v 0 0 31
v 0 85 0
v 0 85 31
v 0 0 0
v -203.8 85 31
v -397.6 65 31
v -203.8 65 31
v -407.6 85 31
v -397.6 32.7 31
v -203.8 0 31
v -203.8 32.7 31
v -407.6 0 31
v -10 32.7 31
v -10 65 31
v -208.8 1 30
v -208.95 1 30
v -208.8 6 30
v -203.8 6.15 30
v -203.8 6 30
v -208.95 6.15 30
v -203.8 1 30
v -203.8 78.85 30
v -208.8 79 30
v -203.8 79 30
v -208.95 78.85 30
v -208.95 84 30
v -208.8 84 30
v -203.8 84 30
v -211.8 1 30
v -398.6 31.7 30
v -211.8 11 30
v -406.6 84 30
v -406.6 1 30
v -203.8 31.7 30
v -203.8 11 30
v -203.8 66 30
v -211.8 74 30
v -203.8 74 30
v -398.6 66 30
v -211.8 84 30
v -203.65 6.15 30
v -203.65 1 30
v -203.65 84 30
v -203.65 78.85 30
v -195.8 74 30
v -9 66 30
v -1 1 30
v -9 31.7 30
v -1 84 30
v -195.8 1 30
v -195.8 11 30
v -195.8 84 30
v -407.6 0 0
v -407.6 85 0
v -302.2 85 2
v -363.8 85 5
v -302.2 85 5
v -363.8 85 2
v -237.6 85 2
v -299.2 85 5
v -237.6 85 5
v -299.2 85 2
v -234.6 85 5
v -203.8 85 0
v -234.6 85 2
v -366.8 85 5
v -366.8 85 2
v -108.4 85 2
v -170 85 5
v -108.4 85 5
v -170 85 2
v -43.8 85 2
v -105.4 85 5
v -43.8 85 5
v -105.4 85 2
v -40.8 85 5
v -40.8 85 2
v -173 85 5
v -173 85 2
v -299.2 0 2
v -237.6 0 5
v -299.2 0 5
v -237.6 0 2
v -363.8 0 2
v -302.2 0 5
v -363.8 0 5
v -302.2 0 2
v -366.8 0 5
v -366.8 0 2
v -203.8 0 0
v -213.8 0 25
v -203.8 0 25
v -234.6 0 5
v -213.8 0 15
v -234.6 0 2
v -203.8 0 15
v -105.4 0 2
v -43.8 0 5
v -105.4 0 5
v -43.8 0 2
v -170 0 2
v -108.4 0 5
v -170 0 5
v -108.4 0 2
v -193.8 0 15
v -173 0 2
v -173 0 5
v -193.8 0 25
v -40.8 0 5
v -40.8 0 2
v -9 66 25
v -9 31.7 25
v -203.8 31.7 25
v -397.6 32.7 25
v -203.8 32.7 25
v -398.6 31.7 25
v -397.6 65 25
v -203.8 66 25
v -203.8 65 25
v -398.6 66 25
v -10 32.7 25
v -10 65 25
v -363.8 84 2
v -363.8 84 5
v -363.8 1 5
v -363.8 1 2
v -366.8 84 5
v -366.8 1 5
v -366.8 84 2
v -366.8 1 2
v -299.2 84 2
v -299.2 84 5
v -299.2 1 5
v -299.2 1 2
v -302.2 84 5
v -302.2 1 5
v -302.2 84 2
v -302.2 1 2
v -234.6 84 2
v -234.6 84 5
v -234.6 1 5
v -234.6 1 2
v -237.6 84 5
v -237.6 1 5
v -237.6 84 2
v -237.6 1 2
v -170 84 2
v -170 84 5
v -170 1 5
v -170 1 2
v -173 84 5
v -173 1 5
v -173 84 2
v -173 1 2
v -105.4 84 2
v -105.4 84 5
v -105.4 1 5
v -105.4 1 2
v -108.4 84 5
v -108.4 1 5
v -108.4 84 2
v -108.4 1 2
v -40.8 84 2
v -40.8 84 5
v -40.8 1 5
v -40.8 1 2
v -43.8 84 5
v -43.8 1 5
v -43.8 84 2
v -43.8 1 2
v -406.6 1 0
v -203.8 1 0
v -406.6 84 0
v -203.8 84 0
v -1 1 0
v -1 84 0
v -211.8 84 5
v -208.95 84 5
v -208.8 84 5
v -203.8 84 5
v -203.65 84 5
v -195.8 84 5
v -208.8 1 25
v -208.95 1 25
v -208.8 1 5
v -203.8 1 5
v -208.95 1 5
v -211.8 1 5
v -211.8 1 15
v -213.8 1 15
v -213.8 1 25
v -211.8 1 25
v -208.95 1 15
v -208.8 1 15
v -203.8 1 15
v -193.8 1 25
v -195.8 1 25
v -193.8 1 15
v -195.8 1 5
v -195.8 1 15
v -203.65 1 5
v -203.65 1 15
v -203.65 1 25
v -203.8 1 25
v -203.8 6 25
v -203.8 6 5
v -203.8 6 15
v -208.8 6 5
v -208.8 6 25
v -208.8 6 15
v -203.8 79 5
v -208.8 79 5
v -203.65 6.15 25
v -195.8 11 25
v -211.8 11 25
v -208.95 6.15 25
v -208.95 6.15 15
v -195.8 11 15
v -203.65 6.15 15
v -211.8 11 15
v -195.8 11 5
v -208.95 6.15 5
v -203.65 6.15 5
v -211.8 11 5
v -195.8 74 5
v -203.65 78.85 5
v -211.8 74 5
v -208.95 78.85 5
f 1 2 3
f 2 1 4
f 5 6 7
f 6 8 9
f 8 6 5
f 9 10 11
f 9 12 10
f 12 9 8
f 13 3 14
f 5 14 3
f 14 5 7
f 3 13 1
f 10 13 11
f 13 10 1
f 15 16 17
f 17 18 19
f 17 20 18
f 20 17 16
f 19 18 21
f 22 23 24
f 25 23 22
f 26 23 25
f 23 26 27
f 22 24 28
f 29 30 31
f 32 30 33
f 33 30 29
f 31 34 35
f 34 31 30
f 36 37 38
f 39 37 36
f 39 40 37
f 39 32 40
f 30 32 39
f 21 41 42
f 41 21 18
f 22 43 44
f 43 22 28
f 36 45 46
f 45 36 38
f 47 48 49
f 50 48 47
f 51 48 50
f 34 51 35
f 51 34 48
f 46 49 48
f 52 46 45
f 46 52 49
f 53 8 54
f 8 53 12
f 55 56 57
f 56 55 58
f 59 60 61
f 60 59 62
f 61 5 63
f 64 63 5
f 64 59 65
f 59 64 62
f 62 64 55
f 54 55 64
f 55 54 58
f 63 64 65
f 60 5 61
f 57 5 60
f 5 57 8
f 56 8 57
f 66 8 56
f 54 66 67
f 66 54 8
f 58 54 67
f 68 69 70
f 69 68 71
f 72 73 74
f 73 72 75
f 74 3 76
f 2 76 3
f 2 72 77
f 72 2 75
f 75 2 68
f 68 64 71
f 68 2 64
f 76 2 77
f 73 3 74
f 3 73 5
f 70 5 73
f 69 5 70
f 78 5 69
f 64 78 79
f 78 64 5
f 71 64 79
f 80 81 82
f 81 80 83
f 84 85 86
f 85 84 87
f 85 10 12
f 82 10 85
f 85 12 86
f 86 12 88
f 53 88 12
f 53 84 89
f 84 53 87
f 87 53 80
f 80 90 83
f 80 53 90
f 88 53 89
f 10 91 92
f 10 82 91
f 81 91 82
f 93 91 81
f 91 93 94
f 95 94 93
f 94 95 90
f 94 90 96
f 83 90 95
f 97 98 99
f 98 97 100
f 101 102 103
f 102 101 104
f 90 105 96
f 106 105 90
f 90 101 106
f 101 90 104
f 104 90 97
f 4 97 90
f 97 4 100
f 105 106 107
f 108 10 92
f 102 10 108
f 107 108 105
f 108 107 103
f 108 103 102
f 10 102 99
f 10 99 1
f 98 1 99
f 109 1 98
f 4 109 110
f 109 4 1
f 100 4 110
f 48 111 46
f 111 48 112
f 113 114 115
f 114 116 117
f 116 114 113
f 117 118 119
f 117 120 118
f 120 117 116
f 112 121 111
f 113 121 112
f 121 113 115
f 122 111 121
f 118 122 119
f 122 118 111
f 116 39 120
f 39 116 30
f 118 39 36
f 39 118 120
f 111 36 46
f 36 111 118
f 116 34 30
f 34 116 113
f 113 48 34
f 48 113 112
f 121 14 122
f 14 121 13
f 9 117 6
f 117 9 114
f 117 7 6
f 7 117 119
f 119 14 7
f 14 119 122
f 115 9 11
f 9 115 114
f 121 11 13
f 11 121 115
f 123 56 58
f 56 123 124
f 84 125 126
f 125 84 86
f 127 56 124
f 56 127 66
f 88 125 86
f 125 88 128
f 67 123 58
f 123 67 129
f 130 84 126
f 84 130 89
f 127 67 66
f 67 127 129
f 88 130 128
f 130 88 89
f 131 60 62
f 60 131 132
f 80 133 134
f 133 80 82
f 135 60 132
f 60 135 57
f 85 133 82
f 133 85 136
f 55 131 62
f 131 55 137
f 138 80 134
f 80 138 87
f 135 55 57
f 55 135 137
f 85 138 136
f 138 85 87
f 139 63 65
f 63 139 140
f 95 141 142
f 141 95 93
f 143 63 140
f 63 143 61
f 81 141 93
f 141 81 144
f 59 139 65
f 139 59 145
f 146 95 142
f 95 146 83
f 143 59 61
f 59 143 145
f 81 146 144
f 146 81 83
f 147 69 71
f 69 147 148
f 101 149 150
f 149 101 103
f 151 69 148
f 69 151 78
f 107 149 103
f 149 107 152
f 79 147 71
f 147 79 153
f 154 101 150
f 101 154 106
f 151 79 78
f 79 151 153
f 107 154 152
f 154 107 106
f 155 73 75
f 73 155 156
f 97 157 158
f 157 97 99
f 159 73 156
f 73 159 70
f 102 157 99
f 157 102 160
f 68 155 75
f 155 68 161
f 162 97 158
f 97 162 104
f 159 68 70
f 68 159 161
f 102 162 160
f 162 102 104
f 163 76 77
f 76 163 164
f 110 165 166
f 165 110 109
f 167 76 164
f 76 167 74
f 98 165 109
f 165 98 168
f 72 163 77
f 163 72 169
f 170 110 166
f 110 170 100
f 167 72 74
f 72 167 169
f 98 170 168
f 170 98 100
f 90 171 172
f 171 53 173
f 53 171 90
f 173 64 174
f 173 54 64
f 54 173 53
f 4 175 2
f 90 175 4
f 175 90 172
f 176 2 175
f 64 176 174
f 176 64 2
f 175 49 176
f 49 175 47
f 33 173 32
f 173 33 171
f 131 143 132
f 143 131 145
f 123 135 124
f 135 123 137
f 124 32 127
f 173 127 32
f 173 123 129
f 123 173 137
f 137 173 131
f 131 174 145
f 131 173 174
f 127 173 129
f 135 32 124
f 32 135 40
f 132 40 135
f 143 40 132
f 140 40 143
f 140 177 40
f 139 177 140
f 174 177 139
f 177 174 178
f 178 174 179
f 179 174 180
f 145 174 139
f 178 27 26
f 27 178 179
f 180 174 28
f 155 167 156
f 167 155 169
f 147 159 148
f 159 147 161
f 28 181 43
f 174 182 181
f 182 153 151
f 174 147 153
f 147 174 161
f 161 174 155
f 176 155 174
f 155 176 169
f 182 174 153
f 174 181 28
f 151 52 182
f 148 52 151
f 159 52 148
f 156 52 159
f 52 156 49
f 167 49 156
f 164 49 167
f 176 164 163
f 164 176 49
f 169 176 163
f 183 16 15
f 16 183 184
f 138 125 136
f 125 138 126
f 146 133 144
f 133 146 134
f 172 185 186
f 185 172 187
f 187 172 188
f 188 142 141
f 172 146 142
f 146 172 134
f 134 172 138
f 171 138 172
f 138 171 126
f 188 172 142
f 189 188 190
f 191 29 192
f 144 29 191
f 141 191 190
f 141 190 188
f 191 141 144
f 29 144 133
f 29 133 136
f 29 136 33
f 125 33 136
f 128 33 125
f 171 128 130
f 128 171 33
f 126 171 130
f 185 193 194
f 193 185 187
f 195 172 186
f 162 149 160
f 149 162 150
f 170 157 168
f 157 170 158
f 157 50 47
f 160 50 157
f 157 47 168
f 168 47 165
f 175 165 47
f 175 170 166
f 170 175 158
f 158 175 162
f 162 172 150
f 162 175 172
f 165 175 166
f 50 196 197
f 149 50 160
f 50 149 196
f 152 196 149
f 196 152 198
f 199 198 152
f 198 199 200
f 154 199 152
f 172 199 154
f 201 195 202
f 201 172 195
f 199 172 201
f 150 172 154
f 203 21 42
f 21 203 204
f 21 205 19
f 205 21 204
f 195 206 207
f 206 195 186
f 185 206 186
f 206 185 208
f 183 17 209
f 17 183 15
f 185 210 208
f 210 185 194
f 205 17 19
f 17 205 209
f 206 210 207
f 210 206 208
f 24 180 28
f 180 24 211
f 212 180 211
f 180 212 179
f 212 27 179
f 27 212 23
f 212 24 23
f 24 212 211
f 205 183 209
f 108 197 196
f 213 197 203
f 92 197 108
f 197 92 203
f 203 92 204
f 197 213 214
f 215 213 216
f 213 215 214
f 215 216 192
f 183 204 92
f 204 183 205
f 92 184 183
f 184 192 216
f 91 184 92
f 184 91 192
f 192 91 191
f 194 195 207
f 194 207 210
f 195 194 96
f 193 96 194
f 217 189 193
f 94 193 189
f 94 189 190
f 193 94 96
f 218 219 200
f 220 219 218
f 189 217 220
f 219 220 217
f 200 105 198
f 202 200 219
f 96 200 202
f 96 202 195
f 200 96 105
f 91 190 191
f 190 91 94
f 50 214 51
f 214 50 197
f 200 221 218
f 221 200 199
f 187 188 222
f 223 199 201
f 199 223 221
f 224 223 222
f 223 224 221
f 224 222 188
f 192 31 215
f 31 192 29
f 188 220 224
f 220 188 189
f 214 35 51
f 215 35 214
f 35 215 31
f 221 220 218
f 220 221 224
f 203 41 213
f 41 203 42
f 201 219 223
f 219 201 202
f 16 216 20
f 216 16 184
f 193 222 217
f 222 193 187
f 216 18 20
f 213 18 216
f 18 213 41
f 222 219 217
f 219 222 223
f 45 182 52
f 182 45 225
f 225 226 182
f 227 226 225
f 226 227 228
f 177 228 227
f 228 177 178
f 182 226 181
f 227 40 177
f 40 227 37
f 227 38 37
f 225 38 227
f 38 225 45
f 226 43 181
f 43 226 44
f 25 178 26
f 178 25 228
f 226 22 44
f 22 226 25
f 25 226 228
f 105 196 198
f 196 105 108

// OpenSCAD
// SPDX-License-Identifier: AGPL-3.0-or-later
// SPDX-FileCopyrightText: Copyright 2022-2025 Zeus WPI

nr_of_screens = 12;
screen_width = 32.3;
box_height = 85;
border_size = 10;
box_width = nr_of_screens*screen_width + 2*border_size;
d_top_of_screen_to_top_of_box = 20;
box_thickness = 31;
screen_border_height = 5; // the border inside the box that neatly fits around the led matrices
screen_border_thickness = 1;

hole_thickness = 3;
nr_of_holes = 6;
holes_spacing = (nr_of_screens*screen_width)/nr_of_holes;
d_holes_to_bottom = 2;

module box() {
    translate([-box_width,0,0]) {
        // top of box and inner border
        translate([0,0,box_thickness-1]) {
            difference() {
                union() {
                    cube([box_width, box_height, 1]);
                    translate([border_size-screen_border_thickness, box_height-d_top_of_screen_to_top_of_box-screen_width-screen_border_thickness,-screen_border_height]) {
                        cube([nr_of_screens*screen_width + 2*screen_border_thickness, screen_width + 2*screen_border_thickness, screen_border_height]);};
                }
                translate([border_size, box_height-d_top_of_screen_to_top_of_box-screen_width, -1-screen_border_height]) {
                    cube([screen_width*nr_of_screens,screen_width, screen_border_height+3]);
                };
            }
        }
        // walls
        difference([]) {
            cube([box_width, box_height, box_thickness]);
            translate([screen_border_thickness,screen_border_thickness,-1]) {cube([box_width-2*screen_border_thickness, box_height-2*screen_border_thickness, box_thickness+2]);}
            
            // holes
            for(i = [0:nr_of_holes-1]) {
                translate([border_size+holes_spacing/2 + i*holes_spacing - hole_thickness/2,-1,d_holes_to_bottom]) {cube([hole_thickness, box_height+2, hole_thickness]);};
            }
        }
        
    };
}

screen_and_pcb_thickness = 12.5;
cover_thickness = 1;
cover_support_pins_height = box_thickness - d_holes_to_bottom - hole_thickness - screen_and_pcb_thickness - cover_thickness +1; // +1 om een beetje spanning te geven
d_cover_sopport_pin_from_top = d_top_of_screen_to_top_of_box + 25;
module cover() {
    translate([-box_width+1,1,d_holes_to_bottom+hole_thickness]) {
        cube([box_width-2, box_height-2, cover_thickness]);
        for(i = [0:nr_of_screens-1]) {
            translate([border_size+screen_width/2 + i*screen_width,box_height-d_cover_sopport_pin_from_top,cover_thickness]) {
                cylinder(cover_support_pins_height,3,3,$f=10);
            }
        }
    };
    
}

// pins
pin_error=0.15;
module pin() {
    pin_thickness = hole_thickness-pin_error;
    difference () {
        cube([pin_thickness, box_height+2, pin_thickness]);
        translate([pin_thickness/2,box_height,-1]) { cylinder(h=pin_thickness+2,r1=0.5,r2=0.5,$fn=10);}
    }
    translate([-1,-1,0]) {cube([pin_thickness+2, 1, pin_thickness+1]);};
}

// split the box in 2
d_connector_to_bottom = d_holes_to_bottom+hole_thickness;
connector_thickness = box_thickness-d_connector_to_bottom-1;
connector_width = 5;
module left_box() {
    difference() {
        box();
        translate([-box_width/2,-1,-1]) cube([box_width/2+1,box_height+2,box_thickness+2]);
    }
    
    // connector
    #translate([-box_width/2-connector_width,1,d_connector_to_bottom]) {
        cube([connector_width,connector_width,connector_thickness]);
        translate([0,box_height-connector_width-2,0]) {cube([connector_width,connector_width,connector_thickness]);}
    }
}
//left_box();
connector_error = 0.15; // distance between 2 pieces of the connector when they fit together
module right_box() {
    difference() {
        box();
        translate([-box_width-1,-1,-1]) cube([box_width/2+1,box_height+2,box_thickness+2]);
    }
    
    // connector
    cube_width = 16;
    cube_height = 10;
    difference() {
        translate([-box_width/2-cube_width/2,1,d_connector_to_bottom]) cube([cube_width,cube_height,connector_thickness]);
        translate([-box_width/2-connector_width-connector_error,0,d_connector_to_bottom-1]) {
            cube([connector_width+2*connector_error,connector_width+connector_error+1,connector_thickness+2]);
        }
    };
    difference() {
        translate([-box_width/2-cube_width/2,box_height-cube_height-1,d_connector_to_bottom]) cube([cube_width,10,connector_thickness]);
        translate([-box_width/2-connector_width-connector_error,box_height-connector_width-1-connector_error,d_connector_to_bottom-1]) {
            cube([connector_width+2*connector_error,connector_width+connector_error+1,connector_thickness+2]);
        }
    };
}

cable_hole_width = 20;
cable_hole_thickness = 10;
d_top_to_hole = 5;
module cable_hole() {
    translate([-box_width/2-cable_hole_width/2,-1,box_thickness-d_top_to_hole-1-cable_hole_thickness]) {cube([cable_hole_width, cable_hole_thickness+3, cable_hole_thickness]);};
}

difference() {
    left_box();
    cable_hole();
}
difference() {
    right_box();
    cable_hole();
}
    
